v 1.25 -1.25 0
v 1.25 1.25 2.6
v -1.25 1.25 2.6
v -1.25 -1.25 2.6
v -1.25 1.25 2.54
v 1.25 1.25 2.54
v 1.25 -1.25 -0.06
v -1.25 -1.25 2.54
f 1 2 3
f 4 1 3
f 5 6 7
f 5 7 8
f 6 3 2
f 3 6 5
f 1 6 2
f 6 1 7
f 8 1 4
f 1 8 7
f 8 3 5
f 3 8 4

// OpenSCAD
// Tent shell kit: roof valley. See lib/lodge_kit.scad.
include <lib/lodge_kit.scad>
kind = "tent";
roof_tile([1, 1, 0, 1], 0);
